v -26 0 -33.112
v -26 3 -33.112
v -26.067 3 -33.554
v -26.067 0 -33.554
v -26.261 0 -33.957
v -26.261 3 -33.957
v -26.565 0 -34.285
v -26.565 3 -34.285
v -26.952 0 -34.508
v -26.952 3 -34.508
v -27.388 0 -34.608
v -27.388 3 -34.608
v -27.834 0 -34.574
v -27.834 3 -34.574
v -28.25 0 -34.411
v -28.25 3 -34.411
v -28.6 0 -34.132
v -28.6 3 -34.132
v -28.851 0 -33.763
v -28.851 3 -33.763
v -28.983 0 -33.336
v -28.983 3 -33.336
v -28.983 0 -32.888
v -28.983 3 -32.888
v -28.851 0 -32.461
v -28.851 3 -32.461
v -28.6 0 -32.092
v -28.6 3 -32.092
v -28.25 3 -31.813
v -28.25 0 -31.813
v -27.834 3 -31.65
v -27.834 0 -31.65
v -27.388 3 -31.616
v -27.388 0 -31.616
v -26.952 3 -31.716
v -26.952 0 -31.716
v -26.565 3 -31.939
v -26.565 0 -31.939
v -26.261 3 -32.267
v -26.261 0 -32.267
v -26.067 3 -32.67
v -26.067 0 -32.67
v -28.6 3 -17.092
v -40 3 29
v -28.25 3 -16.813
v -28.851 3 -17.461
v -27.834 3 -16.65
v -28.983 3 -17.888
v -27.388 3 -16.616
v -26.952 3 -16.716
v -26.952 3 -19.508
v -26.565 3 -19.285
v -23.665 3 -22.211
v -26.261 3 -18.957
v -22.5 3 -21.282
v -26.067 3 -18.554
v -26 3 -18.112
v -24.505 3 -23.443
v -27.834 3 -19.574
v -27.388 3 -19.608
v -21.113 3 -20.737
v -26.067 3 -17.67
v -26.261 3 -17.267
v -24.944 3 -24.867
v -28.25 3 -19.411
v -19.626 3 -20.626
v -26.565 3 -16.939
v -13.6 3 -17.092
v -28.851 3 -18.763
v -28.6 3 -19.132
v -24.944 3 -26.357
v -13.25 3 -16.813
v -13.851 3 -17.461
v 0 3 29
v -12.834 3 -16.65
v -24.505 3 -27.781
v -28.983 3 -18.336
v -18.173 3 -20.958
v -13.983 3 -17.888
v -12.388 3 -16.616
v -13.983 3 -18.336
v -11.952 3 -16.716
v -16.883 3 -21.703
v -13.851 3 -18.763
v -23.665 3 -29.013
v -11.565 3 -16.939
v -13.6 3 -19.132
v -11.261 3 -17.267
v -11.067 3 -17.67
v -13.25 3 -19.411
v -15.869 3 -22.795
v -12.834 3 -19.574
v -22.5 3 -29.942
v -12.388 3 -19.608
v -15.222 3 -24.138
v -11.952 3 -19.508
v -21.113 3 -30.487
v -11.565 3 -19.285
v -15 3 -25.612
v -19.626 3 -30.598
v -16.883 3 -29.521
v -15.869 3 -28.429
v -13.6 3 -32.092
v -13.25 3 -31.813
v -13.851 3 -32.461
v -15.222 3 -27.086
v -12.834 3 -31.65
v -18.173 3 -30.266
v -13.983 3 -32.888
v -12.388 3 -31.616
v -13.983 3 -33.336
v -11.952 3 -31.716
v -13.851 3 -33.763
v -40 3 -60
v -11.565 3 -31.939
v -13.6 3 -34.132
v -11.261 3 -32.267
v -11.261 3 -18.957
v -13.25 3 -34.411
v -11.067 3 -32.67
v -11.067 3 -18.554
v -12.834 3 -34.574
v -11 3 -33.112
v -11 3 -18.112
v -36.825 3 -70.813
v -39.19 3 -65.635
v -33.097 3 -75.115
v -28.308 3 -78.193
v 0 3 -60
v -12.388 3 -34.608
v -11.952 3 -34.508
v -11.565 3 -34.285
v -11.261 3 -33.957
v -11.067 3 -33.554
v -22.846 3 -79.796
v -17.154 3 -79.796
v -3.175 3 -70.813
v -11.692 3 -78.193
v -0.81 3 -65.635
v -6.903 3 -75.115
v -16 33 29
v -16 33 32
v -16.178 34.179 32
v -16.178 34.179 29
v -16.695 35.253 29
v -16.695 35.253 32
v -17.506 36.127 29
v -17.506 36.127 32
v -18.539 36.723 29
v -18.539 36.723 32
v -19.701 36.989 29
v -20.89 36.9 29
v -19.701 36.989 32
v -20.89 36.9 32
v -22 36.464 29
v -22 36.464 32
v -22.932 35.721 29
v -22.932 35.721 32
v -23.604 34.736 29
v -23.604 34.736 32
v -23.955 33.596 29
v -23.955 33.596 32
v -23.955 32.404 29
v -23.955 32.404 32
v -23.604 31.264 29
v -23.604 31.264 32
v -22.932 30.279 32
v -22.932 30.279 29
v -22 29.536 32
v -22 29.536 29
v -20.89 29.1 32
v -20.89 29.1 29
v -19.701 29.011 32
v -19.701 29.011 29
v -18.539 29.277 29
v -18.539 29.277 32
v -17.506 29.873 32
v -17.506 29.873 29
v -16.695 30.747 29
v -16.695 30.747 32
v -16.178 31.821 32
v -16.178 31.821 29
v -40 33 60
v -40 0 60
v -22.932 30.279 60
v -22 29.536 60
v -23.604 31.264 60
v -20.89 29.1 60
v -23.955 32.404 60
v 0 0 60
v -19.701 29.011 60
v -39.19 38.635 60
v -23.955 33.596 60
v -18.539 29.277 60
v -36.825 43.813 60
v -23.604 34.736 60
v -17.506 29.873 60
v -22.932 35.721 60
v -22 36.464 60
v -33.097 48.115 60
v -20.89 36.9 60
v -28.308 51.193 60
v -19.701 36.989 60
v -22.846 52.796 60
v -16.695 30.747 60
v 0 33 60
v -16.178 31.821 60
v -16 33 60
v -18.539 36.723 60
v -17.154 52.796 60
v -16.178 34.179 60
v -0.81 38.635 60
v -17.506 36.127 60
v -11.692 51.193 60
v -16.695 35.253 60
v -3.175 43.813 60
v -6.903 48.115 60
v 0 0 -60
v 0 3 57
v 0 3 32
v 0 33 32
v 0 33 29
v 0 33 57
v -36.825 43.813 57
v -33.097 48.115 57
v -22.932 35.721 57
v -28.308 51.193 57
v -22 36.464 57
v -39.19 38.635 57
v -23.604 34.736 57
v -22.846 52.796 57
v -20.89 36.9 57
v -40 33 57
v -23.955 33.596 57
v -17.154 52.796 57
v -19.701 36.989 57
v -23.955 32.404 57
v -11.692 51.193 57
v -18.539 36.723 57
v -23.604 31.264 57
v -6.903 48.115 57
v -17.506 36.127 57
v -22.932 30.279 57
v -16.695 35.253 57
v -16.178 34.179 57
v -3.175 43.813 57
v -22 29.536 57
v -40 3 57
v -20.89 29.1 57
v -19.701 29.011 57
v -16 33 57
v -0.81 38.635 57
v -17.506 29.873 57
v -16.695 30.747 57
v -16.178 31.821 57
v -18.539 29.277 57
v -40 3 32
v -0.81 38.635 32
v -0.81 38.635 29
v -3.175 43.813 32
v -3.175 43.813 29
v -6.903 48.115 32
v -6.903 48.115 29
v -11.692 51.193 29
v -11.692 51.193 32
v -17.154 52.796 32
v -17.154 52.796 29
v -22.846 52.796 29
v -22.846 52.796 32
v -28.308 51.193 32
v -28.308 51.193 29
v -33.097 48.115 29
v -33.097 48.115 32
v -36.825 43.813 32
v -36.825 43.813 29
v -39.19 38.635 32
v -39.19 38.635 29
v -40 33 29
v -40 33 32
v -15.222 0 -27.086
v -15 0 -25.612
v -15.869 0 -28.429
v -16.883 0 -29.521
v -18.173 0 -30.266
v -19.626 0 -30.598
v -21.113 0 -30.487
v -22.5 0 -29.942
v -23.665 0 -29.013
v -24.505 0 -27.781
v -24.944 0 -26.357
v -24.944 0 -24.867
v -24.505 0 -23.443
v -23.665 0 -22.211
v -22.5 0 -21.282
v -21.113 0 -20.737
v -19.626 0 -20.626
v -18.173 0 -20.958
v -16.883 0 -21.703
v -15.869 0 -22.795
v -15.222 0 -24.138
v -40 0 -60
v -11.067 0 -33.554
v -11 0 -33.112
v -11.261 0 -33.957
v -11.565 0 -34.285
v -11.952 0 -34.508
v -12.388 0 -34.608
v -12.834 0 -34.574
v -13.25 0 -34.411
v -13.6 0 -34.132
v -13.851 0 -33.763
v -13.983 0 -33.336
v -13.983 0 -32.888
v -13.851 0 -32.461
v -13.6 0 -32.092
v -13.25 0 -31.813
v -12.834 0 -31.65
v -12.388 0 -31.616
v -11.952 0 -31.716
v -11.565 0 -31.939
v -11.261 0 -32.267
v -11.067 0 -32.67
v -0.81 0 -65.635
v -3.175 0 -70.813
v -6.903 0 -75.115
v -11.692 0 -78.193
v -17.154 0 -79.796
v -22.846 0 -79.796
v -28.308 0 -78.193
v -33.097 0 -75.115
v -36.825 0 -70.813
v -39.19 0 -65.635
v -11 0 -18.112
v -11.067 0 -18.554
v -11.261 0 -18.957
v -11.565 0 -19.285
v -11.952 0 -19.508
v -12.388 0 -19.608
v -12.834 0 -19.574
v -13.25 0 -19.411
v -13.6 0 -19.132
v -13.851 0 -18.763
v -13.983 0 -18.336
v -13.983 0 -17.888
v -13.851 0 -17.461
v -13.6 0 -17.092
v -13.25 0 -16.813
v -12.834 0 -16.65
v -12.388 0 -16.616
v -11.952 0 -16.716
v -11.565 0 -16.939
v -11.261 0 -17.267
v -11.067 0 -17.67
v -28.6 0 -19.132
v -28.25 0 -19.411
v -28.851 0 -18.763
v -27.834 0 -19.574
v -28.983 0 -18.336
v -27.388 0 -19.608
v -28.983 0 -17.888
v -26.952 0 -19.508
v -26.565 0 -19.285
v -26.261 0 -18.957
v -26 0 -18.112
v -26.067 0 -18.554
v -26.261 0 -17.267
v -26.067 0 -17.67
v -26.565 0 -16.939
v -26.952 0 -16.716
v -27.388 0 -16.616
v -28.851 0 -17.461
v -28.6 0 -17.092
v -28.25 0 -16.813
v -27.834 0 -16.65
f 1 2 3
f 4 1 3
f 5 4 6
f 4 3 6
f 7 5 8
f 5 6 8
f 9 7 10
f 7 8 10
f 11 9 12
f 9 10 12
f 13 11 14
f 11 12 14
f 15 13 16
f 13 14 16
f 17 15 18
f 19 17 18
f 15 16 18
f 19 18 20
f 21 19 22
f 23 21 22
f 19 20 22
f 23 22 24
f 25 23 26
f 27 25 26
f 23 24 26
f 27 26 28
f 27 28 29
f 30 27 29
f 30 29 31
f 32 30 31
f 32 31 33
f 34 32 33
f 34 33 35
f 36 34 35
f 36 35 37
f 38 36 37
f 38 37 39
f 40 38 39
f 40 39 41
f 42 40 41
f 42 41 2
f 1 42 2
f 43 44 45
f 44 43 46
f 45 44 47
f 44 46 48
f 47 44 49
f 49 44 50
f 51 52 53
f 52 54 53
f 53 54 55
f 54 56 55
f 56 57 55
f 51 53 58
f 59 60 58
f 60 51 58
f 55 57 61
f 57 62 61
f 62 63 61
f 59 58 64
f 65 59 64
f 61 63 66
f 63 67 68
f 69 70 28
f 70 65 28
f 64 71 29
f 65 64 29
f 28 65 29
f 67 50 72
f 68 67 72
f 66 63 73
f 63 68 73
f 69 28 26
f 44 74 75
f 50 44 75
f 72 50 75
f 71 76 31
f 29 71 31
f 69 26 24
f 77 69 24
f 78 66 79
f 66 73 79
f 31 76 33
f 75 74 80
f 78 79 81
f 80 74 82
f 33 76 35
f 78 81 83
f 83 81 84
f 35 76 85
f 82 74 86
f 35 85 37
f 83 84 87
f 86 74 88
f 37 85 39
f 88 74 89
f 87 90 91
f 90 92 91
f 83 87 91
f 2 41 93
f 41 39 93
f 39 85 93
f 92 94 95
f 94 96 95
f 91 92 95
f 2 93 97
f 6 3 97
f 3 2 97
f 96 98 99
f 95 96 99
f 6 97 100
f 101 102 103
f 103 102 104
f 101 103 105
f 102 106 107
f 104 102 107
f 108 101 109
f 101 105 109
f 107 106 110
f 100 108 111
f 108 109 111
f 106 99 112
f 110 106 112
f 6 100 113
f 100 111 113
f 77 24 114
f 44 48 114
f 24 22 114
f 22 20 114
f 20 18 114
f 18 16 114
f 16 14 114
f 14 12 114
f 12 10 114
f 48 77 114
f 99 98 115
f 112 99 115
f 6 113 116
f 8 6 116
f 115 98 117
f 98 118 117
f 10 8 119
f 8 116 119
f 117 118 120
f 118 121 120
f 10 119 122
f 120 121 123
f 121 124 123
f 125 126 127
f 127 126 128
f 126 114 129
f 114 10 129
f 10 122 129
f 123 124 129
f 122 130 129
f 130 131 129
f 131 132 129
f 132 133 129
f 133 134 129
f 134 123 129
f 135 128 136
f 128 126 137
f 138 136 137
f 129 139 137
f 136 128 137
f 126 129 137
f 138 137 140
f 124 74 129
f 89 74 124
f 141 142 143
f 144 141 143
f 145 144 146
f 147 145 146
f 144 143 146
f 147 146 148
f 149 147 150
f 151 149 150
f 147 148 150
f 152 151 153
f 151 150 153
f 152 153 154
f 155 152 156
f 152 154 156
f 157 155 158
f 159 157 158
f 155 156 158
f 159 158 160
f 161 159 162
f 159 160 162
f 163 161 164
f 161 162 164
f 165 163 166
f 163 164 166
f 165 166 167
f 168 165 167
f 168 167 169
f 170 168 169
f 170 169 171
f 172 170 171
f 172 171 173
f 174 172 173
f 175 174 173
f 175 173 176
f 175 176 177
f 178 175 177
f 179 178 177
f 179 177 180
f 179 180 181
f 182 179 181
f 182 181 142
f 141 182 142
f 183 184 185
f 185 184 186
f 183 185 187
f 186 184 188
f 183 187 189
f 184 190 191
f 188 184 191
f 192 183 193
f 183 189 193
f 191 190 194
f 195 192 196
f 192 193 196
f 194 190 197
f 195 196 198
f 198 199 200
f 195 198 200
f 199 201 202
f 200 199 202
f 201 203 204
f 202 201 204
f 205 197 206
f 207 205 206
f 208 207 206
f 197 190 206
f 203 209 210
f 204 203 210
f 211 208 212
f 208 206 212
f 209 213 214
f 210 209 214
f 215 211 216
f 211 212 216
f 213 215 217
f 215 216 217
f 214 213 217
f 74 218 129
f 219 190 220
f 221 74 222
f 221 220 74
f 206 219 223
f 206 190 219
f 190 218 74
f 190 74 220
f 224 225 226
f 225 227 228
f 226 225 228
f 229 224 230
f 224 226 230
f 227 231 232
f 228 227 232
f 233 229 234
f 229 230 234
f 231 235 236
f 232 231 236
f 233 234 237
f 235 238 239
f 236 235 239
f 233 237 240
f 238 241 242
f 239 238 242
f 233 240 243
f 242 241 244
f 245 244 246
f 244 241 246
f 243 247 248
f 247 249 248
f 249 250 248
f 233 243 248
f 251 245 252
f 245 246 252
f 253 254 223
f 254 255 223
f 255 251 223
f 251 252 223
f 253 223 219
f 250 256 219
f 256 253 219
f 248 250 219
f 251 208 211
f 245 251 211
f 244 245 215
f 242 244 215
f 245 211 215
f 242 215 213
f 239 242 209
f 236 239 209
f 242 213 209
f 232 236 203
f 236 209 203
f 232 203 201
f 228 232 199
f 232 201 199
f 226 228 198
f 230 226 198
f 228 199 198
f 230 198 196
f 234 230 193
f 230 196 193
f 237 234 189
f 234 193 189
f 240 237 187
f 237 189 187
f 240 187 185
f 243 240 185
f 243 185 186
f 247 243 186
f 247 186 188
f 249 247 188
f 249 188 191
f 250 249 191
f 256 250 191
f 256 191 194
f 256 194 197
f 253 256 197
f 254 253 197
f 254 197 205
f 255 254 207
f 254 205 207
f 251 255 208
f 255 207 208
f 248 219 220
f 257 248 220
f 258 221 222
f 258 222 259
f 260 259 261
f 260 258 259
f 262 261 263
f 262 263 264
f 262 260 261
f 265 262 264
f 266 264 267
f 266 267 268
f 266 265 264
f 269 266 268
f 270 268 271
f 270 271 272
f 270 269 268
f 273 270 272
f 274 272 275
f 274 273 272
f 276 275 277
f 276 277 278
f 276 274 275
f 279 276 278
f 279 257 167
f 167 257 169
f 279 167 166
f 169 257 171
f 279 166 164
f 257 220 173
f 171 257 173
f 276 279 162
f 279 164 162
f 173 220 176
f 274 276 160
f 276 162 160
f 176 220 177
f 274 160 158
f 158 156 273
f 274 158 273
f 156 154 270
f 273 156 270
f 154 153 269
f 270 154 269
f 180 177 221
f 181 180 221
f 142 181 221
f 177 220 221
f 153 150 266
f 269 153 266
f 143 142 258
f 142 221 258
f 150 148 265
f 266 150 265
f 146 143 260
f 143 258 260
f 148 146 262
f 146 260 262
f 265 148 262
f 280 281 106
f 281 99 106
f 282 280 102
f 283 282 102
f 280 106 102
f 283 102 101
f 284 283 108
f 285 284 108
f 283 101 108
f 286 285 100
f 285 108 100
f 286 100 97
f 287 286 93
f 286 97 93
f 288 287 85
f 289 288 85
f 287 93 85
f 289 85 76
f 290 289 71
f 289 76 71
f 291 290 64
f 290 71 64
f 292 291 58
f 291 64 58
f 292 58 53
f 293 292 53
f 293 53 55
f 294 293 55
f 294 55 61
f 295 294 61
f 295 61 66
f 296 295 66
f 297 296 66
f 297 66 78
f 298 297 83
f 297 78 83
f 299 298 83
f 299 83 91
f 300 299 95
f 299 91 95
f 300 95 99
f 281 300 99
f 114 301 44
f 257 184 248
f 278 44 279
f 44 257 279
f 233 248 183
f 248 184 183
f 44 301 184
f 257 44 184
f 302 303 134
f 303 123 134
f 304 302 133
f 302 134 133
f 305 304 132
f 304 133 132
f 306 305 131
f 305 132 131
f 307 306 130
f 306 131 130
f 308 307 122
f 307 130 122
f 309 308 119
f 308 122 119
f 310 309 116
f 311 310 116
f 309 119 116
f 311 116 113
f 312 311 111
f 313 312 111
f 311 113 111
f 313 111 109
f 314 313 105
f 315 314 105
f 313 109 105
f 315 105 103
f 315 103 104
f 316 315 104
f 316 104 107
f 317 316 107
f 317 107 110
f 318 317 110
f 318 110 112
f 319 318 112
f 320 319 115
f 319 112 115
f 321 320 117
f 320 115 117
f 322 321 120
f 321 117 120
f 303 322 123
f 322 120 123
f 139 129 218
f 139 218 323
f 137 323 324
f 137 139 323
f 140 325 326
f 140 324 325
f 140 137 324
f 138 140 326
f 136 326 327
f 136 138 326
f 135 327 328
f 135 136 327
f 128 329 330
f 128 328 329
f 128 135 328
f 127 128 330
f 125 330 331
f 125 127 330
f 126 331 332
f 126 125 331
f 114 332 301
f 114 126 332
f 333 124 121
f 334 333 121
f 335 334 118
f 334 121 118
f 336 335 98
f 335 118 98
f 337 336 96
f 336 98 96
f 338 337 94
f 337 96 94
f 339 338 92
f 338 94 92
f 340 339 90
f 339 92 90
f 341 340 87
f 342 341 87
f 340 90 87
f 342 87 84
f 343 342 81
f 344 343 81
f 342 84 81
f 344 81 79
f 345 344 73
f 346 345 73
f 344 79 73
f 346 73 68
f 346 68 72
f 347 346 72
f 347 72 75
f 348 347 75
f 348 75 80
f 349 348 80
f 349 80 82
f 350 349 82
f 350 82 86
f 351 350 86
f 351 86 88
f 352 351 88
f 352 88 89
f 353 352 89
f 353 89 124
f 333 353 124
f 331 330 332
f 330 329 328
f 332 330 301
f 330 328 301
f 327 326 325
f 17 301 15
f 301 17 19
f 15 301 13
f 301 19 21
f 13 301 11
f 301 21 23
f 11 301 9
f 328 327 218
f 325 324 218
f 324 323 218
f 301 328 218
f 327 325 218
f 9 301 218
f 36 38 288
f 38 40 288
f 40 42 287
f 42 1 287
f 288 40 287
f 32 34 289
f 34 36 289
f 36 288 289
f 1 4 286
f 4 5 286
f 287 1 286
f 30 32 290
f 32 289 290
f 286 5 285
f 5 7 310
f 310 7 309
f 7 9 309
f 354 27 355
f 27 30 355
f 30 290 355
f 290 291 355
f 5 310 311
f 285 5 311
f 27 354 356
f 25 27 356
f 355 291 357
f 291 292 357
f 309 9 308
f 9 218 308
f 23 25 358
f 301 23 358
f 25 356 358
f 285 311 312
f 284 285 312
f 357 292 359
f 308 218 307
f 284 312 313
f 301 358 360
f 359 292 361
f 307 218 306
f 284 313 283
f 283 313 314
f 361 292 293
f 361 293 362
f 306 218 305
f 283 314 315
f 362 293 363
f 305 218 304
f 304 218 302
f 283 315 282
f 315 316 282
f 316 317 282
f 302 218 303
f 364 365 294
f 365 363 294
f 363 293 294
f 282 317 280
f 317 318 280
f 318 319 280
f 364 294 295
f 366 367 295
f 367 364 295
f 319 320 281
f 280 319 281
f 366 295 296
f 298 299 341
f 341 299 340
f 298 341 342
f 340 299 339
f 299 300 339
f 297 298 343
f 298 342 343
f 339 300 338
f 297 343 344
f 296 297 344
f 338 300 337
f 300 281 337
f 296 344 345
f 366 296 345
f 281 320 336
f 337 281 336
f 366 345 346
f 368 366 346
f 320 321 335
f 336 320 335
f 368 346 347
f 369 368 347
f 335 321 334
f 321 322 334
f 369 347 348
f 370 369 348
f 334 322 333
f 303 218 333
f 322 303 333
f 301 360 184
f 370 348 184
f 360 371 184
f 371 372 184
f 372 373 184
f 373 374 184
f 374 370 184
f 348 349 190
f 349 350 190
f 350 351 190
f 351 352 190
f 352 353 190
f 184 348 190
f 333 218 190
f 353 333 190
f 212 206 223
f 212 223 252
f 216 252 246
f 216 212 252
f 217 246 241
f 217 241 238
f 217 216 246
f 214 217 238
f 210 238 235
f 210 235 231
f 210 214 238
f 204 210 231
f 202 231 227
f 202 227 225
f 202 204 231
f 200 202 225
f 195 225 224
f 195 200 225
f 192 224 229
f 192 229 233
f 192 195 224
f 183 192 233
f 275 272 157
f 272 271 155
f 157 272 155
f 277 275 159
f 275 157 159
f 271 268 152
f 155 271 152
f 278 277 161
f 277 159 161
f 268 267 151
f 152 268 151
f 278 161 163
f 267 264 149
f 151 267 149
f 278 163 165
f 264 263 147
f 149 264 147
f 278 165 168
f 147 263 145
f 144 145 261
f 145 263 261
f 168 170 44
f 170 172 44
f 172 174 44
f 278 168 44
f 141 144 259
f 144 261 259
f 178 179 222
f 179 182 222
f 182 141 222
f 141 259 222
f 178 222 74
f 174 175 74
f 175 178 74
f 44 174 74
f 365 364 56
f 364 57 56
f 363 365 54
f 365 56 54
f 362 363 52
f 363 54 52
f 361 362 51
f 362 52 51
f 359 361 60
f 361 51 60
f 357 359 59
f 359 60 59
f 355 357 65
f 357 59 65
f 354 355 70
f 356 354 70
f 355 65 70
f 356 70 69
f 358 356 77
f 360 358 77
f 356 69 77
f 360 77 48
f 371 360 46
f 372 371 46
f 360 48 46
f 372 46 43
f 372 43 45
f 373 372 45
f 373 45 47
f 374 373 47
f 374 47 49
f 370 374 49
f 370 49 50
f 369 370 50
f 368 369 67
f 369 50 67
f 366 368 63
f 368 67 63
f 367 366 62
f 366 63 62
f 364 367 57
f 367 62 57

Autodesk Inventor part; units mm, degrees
ref_plane "YZ Plane" through (0, 0, 0) normal (1, 0, 0) x (0, 1, 0)
ref_plane "XZ Plane" through (0, 0, 0) normal (0, 1, 0) x (-1, 0, 0)
ref_plane "XY Plane" through (0, 0, 0) normal (0, 0, 1) x (1, 0, 0)
sketch "Boceto1" plane through (0, 0, 0) normal (1, 0, 0) x (0, 1, 0)
  line L0 (0, 0) -> (0, 60)
  line L1 (0, 0) -> (0, -80)
  line L2 (0, 60) -> (3, 60)
  line L3 (3, -80) -> (0, -80)
  line L4 (3, 60) -> (53, 60)
  line L5 (53, 60) -> (53, 57)
  line L6 (53, 57) -> (3, 57)
  line L7 (3, 32) -> (53, 32)
  line L8 (53, 32) -> (53, 29)
  line L9 (53, 29) -> (3, 29)
  line L10 (3, 57) -> (3, 32)
  line L11 (3, 29) -> (3, -80)
  dimension "d0" = 60
  dimension "d1" = 80
  dimension "d2" = 3
  dimension "d3" = 140
  dimension "d4" = 50
  dimension "d5" = 3
  dimension "d6" = 50
  dimension "d7" = 3
  dimension "d8" = 25
extrude "Extrusión1" add sketch "Boceto1" against normal blind 40
sketch "Boceto2" plane through (0, 3, 29) normal (0, 1, 0) x (1, 0, 0)
  line L0 (-40, 109) -> (-40, -31) projected
  line L1 (0, 109) -> (-40, 109) projected
  arc A0 (0, 89) -> (-40, 89) centre (-20, 89) ccw
  line L2 (0, 89) -> (0, 109)
  line L3 (-40, 109) -> (-40, 89)
  point P0 (0, 29)
  point P1 (-20, 109)
extrude "Extrusión2" cut sketch "Boceto2" against normal blind 40
sketch "Boceto3" plane through (0, 0, 60) normal (0, 0, 1) x (1, 0, 0)
  line L0 (0, 53) -> (-40, 53) projected
  arc A0 (0, 33) -> (-40, 33) centre (-20, 33) ccw
  line L1 (-40, 33) -> (-40, 53)
  line L2 (0, 53) -> (0, 33)
  point P0 (0, 0)
  point P1 (-20, 53)
extrude "Extrusión3" cut sketch "Boceto3" against normal blind 40
sketch "Boceto4" plane through (-40, 0, 60) normal (0, 0, 1) x (1, 0, 0)
  arc A0 (40, 33) -> (0, 33) centre (20, 33) ccw projected
  circle A1 centre (20, 33) radius 4
  point P0 (40, 0)
  dimension "d15" = 8
extrude "Extrusión4" cut sketch "Boceto4" against normal blind 40
sketch "Boceto5" plane through (-40, 3, 29) normal (0, 1, 0) x (1, 0, 0)
  line L0 (0, 0) -> (0, 89.224)
  line L1 (0, 44.612) -> (40, 44.612)
  line L2 (20, 44.612) -> (20, 54.612)
  circle A0 centre (20, 54.612) radius 5
  point P0 (40, 29)
  dimension "d20" = 10
  dimension "d21" = 10
extrude "Extrusión5" cut sketch "Boceto5" against normal blind 40
sketch "Boceto6" plane through (-40, 3, 29) normal (0, 1, 0) x (1, 0, 0)
  line L0 (27.5, 62.112) -> (12.5, 62.112)
  line L1 (12.5, 62.112) -> (12.5, 47.112)
  line L2 (12.5, 47.112) -> (27.5, 47.112)
  line L3 (27.5, 47.112) -> (27.5, 62.112)
  circle A0 centre (20, 54.612) radius 5 projected
  line L4 (27.5, 62.112) -> (12.5, 47.112) construction
  line L5 (12.5, 62.112) -> (27.5, 47.112) construction
  circle A1 centre (12.5, 62.112) radius 1.5
  circle A2 centre (27.5, 62.112) radius 1.5
  circle A3 centre (12.5, 47.112) radius 1.5
  circle A4 centre (27.5, 47.112) radius 1.5
  point P0 (40, 29)
  dimension "d24" = 15
  dimension "d25" = 15
  dimension "d26" = 3
  dimension "d27" = 3
  dimension "d28" = 3
  dimension "d29" = 3
extrude "Extrusión6" cut sketch "Boceto6" against normal blind 5 contours A1 L1 L0 | L0 L1 A1 | A2 L3 L0 | L0 L3 A2 | A3 L2 L1 | L1 L2 A3 | A4 L2 L3 | L3 L2 A4
properties part number "Base_engine" material "Plástico ABS"
